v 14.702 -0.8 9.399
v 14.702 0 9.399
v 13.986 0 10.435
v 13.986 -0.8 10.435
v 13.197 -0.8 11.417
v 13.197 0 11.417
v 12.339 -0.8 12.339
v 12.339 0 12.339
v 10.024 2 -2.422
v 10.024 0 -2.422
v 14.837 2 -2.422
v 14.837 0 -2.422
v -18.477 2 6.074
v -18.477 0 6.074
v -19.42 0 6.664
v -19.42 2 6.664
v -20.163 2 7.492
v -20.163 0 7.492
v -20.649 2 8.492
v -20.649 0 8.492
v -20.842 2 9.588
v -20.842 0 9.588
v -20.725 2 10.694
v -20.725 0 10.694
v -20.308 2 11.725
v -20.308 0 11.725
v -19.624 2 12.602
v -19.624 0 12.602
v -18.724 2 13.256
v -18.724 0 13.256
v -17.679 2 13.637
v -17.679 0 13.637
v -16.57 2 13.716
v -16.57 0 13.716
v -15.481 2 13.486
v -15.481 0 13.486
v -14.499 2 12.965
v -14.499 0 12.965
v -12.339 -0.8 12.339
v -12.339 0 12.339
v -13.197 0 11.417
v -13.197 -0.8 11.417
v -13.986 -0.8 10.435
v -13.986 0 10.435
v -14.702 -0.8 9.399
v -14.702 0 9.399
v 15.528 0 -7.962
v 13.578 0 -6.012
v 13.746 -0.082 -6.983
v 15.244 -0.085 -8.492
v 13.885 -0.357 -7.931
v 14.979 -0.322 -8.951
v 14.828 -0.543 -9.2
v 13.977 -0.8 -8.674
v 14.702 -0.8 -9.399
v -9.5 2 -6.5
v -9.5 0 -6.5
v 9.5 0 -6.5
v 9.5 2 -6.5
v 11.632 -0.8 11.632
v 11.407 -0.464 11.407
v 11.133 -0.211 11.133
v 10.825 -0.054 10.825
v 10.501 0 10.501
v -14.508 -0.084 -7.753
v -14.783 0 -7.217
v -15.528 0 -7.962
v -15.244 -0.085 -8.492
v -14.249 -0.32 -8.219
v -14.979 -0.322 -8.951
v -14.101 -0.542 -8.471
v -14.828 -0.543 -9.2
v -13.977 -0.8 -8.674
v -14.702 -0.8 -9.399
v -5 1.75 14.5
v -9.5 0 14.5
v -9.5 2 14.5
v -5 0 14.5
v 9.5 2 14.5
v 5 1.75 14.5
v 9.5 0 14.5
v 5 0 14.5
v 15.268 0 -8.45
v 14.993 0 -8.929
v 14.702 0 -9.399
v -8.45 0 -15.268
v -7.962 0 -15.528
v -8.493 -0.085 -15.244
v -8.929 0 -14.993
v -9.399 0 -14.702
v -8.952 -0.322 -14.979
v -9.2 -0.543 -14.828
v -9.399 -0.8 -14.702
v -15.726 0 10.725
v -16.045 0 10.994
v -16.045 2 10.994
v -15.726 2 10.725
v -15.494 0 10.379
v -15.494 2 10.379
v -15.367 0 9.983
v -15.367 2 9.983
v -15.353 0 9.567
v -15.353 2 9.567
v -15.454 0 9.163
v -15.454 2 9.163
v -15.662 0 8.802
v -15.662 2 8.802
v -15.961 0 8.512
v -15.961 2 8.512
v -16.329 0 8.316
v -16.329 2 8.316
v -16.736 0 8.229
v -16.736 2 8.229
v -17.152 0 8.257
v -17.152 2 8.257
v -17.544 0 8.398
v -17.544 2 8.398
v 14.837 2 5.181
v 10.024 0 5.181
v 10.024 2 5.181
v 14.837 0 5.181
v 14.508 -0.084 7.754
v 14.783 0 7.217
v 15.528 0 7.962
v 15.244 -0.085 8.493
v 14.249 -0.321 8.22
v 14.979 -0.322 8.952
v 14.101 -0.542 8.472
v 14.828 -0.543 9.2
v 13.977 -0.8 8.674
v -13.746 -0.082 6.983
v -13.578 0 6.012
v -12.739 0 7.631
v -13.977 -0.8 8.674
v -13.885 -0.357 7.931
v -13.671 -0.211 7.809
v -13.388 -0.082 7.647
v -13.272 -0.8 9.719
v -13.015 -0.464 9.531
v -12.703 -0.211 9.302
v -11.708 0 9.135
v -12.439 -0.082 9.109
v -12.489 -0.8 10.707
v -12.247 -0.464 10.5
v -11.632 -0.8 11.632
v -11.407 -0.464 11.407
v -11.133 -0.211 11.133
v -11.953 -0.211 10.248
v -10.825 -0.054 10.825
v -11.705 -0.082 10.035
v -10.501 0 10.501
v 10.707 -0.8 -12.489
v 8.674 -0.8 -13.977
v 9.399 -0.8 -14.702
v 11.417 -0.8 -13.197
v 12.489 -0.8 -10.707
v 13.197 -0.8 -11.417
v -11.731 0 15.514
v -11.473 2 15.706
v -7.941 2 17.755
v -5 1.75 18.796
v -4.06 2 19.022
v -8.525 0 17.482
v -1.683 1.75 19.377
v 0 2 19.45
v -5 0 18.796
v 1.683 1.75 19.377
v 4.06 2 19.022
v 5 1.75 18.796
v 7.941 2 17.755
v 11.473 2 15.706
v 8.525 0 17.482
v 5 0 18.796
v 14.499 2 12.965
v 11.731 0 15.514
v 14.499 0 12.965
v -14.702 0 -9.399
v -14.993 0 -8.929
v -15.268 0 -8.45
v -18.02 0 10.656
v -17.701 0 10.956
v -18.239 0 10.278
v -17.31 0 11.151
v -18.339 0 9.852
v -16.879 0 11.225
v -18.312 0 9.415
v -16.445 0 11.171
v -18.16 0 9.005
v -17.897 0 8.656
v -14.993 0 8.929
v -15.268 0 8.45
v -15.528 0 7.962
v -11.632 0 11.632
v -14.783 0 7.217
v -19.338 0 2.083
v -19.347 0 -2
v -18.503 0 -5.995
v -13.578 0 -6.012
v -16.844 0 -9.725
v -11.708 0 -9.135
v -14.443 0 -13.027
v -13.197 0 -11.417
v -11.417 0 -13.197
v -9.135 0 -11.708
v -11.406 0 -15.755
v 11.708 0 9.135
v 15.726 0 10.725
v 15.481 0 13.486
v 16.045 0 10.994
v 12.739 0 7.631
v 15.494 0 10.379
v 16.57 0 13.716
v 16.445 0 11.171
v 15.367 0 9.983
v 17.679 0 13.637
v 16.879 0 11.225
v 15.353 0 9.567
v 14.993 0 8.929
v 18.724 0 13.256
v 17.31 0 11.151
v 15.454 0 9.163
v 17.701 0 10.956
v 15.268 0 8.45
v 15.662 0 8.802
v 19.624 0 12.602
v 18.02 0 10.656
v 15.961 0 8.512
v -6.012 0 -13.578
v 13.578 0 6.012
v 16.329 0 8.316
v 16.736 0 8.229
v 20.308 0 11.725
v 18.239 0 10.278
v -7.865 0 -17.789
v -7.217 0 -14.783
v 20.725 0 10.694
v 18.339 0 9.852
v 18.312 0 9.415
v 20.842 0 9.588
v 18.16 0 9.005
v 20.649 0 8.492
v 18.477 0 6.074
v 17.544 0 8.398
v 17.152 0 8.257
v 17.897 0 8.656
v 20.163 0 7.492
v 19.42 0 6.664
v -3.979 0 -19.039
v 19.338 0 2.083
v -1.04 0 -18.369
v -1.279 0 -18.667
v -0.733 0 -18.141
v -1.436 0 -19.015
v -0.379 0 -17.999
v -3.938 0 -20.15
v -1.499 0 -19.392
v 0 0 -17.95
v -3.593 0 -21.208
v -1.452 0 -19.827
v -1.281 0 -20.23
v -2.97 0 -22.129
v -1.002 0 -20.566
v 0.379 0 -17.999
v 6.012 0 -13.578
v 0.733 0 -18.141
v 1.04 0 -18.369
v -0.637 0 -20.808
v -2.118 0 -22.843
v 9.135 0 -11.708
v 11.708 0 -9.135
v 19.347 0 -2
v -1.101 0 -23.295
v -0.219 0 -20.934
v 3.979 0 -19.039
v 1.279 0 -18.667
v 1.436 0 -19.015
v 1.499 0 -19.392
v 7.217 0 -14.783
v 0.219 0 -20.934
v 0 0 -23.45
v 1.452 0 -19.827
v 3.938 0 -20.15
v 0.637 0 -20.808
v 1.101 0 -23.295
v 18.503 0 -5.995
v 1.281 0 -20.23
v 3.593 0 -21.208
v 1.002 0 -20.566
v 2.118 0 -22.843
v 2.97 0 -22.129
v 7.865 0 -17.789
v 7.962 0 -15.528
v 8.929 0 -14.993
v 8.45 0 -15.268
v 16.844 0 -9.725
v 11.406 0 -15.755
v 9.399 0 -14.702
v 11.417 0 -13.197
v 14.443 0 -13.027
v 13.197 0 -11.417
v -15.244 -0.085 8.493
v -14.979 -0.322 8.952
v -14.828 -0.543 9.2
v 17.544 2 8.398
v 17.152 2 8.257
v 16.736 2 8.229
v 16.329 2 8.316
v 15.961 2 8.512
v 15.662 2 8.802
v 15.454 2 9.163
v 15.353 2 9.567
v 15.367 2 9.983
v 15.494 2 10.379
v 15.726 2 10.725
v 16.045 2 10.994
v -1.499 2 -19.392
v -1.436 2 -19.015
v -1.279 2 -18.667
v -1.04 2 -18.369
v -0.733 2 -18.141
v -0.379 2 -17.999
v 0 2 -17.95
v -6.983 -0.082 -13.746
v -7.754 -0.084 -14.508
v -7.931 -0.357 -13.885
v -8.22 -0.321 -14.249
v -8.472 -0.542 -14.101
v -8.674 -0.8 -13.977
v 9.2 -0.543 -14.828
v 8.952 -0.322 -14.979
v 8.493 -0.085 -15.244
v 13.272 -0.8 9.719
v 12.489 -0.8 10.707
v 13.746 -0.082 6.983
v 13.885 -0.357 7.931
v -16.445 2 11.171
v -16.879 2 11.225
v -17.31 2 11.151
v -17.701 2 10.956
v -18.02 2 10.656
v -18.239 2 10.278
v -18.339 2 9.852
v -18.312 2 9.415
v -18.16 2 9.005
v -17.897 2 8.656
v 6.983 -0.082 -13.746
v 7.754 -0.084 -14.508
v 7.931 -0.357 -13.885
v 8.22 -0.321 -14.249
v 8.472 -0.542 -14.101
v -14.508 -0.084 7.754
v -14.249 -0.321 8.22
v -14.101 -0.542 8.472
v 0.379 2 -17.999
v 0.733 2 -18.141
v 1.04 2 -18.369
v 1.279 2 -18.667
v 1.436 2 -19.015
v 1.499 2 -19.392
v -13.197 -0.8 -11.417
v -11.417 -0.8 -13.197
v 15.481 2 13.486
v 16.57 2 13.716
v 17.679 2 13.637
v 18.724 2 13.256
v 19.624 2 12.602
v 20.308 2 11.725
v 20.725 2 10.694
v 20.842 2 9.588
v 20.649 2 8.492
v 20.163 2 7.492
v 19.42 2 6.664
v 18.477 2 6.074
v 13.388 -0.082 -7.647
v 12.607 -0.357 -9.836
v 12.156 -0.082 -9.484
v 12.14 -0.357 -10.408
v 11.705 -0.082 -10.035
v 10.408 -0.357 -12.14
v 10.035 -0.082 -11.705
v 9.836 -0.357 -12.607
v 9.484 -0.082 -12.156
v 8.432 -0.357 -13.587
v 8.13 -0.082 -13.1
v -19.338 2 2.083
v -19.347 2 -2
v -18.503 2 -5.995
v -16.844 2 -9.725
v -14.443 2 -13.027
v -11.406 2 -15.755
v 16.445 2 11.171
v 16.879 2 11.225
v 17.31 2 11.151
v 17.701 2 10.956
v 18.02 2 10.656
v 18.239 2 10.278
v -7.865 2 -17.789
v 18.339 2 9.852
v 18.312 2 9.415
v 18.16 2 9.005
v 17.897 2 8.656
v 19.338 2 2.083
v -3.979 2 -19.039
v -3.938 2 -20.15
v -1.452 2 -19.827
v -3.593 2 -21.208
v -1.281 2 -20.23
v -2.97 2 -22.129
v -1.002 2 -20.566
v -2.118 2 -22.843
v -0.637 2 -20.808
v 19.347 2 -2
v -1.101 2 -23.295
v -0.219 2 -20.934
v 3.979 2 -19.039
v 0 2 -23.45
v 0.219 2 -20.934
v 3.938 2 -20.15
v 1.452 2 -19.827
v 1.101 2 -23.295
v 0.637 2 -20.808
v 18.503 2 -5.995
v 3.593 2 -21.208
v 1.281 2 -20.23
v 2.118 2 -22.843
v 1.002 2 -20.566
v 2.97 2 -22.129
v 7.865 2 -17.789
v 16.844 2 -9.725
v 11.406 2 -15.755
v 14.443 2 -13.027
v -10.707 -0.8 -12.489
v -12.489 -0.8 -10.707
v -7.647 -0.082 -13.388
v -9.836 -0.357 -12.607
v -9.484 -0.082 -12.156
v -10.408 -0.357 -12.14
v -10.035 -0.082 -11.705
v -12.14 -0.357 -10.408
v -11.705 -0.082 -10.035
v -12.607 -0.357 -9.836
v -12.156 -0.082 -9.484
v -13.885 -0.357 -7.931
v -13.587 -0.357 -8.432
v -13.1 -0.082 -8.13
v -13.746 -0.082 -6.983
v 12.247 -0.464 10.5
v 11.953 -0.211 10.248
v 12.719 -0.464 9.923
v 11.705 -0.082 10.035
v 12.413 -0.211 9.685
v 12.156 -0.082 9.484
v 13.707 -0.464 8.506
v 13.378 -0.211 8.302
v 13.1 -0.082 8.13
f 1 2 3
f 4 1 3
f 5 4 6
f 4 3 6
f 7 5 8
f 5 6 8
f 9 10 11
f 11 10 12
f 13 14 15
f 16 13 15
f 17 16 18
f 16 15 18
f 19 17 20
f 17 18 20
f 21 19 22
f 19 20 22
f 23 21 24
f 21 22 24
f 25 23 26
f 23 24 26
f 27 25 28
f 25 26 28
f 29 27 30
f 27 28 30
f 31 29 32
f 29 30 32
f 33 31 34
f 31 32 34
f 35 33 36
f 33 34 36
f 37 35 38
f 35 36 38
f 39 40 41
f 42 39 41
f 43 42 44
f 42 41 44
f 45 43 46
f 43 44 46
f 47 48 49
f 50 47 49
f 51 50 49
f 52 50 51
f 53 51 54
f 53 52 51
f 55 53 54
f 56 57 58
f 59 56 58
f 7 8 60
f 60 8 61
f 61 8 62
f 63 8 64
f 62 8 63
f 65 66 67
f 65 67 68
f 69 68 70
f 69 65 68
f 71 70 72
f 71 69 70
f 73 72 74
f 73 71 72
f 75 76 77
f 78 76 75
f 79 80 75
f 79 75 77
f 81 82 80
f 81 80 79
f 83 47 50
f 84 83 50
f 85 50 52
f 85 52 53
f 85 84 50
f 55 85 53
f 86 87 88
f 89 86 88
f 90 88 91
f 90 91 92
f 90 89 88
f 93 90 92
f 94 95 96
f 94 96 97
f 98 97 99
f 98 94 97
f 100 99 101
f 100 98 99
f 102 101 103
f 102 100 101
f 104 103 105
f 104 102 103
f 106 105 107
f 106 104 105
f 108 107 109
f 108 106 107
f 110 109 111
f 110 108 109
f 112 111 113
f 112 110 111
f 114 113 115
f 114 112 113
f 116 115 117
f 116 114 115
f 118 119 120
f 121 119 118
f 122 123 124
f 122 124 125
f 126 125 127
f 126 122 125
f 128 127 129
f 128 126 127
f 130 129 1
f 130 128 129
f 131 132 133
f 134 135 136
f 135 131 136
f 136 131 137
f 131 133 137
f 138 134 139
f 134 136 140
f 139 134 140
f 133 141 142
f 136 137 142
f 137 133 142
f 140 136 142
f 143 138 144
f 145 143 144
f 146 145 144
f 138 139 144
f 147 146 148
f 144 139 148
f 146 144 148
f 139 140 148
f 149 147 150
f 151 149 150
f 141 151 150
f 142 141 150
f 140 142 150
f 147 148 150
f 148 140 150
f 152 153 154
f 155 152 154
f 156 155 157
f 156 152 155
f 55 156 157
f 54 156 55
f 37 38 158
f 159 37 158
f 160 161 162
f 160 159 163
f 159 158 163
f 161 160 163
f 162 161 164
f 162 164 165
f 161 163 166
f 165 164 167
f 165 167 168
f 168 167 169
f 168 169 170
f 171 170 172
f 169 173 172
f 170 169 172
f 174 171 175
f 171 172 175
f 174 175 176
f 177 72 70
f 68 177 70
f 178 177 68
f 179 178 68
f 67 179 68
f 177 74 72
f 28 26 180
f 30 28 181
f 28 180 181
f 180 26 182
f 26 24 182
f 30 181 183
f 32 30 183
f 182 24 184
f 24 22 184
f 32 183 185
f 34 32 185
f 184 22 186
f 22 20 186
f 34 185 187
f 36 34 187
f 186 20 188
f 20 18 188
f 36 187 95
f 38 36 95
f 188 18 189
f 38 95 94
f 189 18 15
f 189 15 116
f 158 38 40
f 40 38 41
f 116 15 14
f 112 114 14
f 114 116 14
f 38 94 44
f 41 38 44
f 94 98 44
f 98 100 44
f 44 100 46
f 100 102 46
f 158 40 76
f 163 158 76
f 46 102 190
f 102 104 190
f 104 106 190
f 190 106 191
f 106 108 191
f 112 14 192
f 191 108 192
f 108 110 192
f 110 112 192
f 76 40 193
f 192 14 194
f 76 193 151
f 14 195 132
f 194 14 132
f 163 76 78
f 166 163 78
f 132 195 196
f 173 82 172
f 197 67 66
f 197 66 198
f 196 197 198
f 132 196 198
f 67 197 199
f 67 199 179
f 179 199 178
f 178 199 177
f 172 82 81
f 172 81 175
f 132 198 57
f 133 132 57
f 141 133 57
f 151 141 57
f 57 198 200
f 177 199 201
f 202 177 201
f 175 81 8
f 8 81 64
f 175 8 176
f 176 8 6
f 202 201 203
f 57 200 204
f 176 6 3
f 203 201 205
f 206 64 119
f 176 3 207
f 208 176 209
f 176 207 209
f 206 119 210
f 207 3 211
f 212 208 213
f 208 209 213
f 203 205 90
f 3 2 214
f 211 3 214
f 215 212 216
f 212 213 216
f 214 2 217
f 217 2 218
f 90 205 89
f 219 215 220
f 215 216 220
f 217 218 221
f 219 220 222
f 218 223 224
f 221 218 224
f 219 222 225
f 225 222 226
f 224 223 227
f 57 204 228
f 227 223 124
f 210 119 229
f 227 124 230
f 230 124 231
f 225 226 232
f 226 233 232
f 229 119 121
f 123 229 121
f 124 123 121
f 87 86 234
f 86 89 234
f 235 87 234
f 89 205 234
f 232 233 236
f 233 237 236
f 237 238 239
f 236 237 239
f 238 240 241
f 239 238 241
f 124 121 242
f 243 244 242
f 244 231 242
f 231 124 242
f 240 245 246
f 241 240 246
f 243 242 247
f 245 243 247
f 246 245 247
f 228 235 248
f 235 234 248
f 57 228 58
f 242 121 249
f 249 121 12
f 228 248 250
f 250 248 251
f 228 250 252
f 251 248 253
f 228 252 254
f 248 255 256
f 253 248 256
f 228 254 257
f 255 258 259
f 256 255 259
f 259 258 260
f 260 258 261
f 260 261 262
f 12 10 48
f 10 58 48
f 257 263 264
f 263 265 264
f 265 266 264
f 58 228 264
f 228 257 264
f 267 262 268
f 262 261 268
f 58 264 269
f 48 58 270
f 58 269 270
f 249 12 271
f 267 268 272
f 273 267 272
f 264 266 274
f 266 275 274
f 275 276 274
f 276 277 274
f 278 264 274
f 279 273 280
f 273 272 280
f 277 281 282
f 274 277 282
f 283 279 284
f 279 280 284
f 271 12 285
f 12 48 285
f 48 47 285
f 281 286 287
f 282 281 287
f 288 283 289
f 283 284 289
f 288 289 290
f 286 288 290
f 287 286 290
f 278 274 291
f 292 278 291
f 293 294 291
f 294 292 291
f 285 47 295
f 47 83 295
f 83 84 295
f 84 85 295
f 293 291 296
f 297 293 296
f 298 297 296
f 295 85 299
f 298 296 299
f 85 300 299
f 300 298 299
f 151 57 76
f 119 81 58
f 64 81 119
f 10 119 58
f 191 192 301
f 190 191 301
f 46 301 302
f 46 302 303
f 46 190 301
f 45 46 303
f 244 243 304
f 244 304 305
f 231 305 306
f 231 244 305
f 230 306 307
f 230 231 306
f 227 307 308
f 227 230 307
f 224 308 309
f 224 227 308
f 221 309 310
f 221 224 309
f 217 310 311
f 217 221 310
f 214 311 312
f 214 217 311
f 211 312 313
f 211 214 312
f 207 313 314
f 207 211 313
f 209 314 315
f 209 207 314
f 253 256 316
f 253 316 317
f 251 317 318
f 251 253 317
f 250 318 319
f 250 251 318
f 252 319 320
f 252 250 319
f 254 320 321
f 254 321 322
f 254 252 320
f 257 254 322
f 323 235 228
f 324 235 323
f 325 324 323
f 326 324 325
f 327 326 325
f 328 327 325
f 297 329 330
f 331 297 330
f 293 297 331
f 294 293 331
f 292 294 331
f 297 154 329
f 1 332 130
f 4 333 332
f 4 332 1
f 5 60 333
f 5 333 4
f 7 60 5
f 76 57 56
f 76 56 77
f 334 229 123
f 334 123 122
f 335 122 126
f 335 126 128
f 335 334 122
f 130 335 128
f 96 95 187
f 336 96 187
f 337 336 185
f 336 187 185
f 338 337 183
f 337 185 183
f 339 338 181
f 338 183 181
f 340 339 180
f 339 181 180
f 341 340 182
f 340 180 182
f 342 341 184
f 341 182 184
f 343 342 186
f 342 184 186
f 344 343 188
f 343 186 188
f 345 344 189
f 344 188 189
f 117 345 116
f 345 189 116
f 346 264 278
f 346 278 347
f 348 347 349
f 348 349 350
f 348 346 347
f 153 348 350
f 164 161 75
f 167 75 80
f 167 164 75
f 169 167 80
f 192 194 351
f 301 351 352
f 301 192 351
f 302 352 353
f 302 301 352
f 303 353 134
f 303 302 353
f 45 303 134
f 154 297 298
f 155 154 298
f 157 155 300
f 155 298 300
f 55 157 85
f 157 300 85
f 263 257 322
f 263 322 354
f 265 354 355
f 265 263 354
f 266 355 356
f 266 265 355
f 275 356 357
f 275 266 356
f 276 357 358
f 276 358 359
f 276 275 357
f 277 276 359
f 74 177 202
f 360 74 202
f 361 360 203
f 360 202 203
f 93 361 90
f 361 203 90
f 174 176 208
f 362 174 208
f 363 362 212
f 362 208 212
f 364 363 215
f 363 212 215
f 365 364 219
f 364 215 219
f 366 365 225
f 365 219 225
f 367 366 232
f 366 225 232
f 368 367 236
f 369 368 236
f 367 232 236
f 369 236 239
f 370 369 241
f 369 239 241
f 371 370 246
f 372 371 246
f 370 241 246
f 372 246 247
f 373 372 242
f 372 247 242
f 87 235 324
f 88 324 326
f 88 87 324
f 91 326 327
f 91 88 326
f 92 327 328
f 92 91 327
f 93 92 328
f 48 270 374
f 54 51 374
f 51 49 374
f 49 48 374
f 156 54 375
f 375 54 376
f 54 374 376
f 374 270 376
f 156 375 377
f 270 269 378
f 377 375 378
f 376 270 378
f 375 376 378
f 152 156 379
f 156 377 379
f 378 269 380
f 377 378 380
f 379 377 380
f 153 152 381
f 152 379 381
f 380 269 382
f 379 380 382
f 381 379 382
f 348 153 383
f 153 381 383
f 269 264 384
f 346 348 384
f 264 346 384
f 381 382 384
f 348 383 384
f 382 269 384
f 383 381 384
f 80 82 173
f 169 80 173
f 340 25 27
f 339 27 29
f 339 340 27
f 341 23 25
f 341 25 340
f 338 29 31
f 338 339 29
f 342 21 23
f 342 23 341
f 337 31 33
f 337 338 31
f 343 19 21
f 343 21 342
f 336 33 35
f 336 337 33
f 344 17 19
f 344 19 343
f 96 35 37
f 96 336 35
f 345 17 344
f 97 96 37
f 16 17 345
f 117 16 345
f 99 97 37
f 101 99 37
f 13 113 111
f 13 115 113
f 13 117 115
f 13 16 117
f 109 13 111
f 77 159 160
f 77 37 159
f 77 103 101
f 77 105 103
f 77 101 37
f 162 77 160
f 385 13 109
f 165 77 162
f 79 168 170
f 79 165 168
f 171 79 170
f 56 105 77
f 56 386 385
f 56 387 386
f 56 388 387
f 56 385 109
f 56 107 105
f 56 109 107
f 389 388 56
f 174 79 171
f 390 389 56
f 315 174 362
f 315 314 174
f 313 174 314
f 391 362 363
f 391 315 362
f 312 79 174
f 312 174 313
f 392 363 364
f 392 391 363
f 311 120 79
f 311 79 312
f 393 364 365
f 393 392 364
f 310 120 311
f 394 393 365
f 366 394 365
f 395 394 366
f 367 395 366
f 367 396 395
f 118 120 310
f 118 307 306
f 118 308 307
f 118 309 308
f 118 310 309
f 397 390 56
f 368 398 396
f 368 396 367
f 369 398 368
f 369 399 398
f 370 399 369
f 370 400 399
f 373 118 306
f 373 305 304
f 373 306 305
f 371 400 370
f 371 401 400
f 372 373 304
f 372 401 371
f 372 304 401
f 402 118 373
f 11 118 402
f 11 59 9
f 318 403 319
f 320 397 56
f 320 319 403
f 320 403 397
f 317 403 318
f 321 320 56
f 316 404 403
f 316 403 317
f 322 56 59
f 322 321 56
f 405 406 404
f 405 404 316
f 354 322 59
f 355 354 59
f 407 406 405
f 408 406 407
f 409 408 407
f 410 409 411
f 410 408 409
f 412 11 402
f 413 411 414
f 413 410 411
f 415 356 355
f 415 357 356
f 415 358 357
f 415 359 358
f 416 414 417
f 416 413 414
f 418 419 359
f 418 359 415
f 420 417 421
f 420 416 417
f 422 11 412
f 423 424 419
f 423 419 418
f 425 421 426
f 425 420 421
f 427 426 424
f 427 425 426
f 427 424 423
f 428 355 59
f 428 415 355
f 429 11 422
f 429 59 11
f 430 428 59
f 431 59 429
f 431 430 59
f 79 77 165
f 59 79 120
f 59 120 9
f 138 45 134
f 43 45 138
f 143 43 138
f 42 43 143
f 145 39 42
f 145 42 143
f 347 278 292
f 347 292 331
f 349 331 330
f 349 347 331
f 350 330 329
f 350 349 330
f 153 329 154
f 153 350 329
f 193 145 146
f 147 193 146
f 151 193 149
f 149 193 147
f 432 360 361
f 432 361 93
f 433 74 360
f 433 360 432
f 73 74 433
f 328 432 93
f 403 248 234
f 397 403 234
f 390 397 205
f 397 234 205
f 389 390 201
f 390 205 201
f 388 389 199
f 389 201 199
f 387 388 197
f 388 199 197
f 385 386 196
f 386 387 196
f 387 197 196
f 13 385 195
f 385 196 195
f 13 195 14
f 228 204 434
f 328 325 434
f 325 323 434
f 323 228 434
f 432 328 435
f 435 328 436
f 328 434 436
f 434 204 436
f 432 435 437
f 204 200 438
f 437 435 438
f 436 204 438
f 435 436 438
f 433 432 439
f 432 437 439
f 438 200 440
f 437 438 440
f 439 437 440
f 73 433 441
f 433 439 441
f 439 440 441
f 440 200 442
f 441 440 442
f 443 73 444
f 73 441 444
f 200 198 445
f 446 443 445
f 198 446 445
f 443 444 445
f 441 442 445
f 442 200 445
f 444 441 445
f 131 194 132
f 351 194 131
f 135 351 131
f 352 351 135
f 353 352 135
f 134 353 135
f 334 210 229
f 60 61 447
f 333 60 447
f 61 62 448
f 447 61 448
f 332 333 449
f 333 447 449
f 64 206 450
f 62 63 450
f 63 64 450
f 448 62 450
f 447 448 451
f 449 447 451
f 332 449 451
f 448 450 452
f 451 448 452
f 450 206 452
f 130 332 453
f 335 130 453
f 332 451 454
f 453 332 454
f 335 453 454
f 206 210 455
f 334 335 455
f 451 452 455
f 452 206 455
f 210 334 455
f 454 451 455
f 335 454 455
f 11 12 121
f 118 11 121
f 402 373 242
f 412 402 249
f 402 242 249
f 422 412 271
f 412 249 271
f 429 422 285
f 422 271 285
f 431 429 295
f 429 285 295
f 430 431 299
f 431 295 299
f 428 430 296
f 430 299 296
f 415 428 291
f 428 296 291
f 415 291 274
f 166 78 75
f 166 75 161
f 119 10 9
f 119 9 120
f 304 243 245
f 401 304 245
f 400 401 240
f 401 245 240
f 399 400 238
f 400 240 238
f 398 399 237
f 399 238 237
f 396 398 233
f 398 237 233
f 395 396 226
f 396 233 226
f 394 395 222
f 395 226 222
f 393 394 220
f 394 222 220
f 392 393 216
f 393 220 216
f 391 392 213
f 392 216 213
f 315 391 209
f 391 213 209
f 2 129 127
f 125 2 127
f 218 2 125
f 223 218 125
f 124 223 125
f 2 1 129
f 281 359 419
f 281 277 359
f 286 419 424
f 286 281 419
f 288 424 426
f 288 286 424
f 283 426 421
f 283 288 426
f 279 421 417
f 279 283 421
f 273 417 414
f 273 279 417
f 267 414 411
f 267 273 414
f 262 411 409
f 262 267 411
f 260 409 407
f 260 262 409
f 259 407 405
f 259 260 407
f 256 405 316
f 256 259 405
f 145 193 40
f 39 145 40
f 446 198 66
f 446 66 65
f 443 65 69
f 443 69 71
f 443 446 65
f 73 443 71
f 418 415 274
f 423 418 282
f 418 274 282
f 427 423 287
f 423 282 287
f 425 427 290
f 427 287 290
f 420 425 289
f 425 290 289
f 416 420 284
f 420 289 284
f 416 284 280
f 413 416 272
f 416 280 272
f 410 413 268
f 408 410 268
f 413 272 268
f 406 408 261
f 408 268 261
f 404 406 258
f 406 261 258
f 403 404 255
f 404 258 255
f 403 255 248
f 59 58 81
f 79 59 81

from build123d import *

# Parameters (mm, degrees)
ESQUISSE2_R                    = 19.45
BOSS_EXTRU_1_DEPTH             = 2
ESQUISSE2_3_R                  = 19.45
ESQUISSE2_3_R_2                = 4
ESQUISSE2_3_R_3                = 1.5
BOSS_EXTRU_2_DEPTH             = 2
ENL_V_MAT_EXTRU_2_DEPTH        = 2
R_P_TITION_CIRCULAIRE1_DEPTH   = 2
R_P_TITION_CIRCULAIRE1_2_DEPTH = 2
BOSS_EXTRU_3_DEPTH             = 0.8
CONG_1_R                       = 2
ESQUISSE6_W                    = 4.812747309
ESQUISSE6_H                    = 7.603139871
ENL_V_MAT_EXTRU_3_DEPTH        = 10
ESQUISSE7_W                    = 19
ESQUISSE7_H                    = 21
ENL_V_MAT_EXTRU_4_DEPTH        = 3.5
ESQUISSE8_W                    = 10
ESQUISSE8_H                    = 6.246978905
ENL_V_MAT_EXTRU_5_DEPTH        = 1.75


# Read off the part's stored shape, not the designer's step: Répétition circulaire1
with BuildPart() as part:
    # Esquisse2 → Boss.-Extru.1 (new body)
    with BuildSketch(Plane(origin=(0, 0, 0), x_dir=(1, 0, 0), z_dir=(0, 1, 0))):
        with Locations(Location((0, 0, 0), (0, 0, 270))):
            Circle(ESQUISSE2_R)
    extrude(amount=BOSS_EXTRU_1_DEPTH)

    # Esquisse2<3> → Boss.-Extru.2 (add)
    # profile 1 of 2: a face of its own
    with BuildSketch(Plane(origin=(0, 0, 0), x_dir=(1, 0, 0), z_dir=(0, 1, 0))):
        Circle(ESQUISSE2_3_R)
    # profile 2 of 2: a face of its own
    with BuildSketch(Plane(origin=(0, 0, 0), x_dir=(1, 0, 0), z_dir=(0, 1, 0))):
        with Locations((0, 19.45)):
            Circle(ESQUISSE2_3_R_2)
        with Locations((0, 19.45)):
            Circle(ESQUISSE2_3_R_3, mode=Mode.SUBTRACT)
    extrude(amount=BOSS_EXTRU_2_DEPTH)

    # Esquisse2<4> → Enlèv. mat.-Extru.2 (cut)
    with BuildSketch(Plane(origin=(0, 0, 0), x_dir=(1, 0, 0), z_dir=(0, 1, 0))):
        with BuildLine():
            ThreePointArc((1.498884406, 19.392159383), (0.75, 19.435534467), (0, 19.45))
            Line((0, 19.45), (0, 17.95))
            ThreePointArc((0, 17.95), (1.040009393, 18.369083508), (1.498884406, 19.392159383))
        make_face()
        with BuildLine():
            Line((0, 17.95), (0, 19.45))
            ThreePointArc((0, 19.45), (-0.75, 19.435534467), (-1.498884406, 19.392159383))
            ThreePointArc((-1.498884406, 19.392159383), (-1.040009393, 18.369083508), (0, 17.95))
        make_face()
    extrude(amount=ENL_V_MAT_EXTRU_2_DEPTH, mode=Mode.SUBTRACT)

    # Répétition circulaire1 outline → Répétition circulaire1 (cut)
    with BuildSketch(Plane(origin=(0, 0, 0), x_dir=(1, 0, 0), z_dir=(0, 1, 0))):
        with BuildLine():
            ThreePointArc((16.044660457, -10.994151664), (16.844194104, -9.725), (17.543544863, -8.398007718))
            ThreePointArc((17.543544863, -8.398007718), (15.545155998, -8.975), (16.044660457, -10.994151664))
        make_face()
        with BuildLine():
            ThreePointArc((-17.543544863, -8.398007718), (-16.844194104, -9.725), (-16.044660457, -10.994151664))
            ThreePointArc((-16.044660457, -10.994151664), (-15.545155998, -8.975), (-17.543544863, -8.398007718))
        make_face()
    extrude(amount=R_P_TITION_CIRCULAIRE1_DEPTH, mode=Mode.SUBTRACT)

    # R_p_tition circulaire1 2 outline → R_p_tition circulaire1 2 (add)
    with BuildSketch(Plane(origin=(0, 0, 0), x_dir=(1, 0, 0), z_dir=(0, 1, 0))):
        with BuildLine():
            ThreePointArc((17.543544863, -8.398007718), (18.14323221, -10.475), (16.044660457, -10.994151664))
            ThreePointArc((16.044660457, -10.994151664), (15.303387831, -12.004533347), (14.49858993, -12.965083496))
            ThreePointArc((14.49858993, -12.965083496), (20.308295719, -11.725), (18.477386634, -6.07360545))
            ThreePointArc((18.477386634, -6.07360545), (18.047924755, -7.250855952), (17.543544863, -8.398007718))
        make_face()
        with BuildLine():
            ThreePointArc((-18.477386634, -6.07360545), (-20.308295719, -11.725), (-14.49858993, -12.965083496))
            ThreePointArc((-14.49858993, -12.965083496), (-15.303387831, -12.004533347), (-16.044660457, -10.994151664))
            ThreePointArc((-16.044660457, -10.994151664), (-18.14323221, -10.475), (-17.543544863, -8.398007718))
            ThreePointArc((-17.543544863, -8.398007718), (-18.047924755, -7.250855952), (-18.477386634, -6.07360545))
        make_face()
    extrude(amount=R_P_TITION_CIRCULAIRE1_2_DEPTH)

    # Esquisse5 → Boss.-Extru.3 (add)
    with BuildSketch(Plane.XZ):
        with BuildLine():
            Line((8.673984211, -13.97728507), (9.39907569, -14.702376549))
            ThreePointArc((9.39907569, -14.702376549), (12.339013332, -12.339013332), (14.702376549, -9.39907569))
            Line((14.702376549, -9.39907569), (13.97728507, -8.673984211))
            ThreePointArc((13.97728507, -8.673984211), (11.631906551, -11.631906551), (8.673984211, -13.97728507))
        make_face()
        with BuildLine():
            ThreePointArc((-14.702376549, -9.39907569), (-12.339013332, -12.339013332), (-9.39907569, -14.702376549))
            Line((-9.39907569, -14.702376549), (-8.673984211, -13.97728507))
            ThreePointArc((-8.673984211, -13.97728507), (-11.631906551, -11.631906551), (-13.97728507, -8.673984211))
            Line((-13.97728507, -8.673984211), (-14.702376549, -9.39907569))
        make_face()
        with BuildLine():
            Line((13.97728507, 8.673984211), (14.702376549, 9.39907569))
            ThreePointArc((14.702376549, 9.39907569), (13.600367642, 10.933091969), (12.339013332, 12.339013332))
            Line((12.339013332, 12.339013332), (11.631906551, 11.631906551))
            ThreePointArc((11.631906551, 11.631906551), (12.88972459, 10.220445196), (13.97728507, 8.673984211))
        make_face()
        with BuildLine():
            ThreePointArc((-12.339013332, 12.339013332), (-13.600367642, 10.933091969), (-14.702376549, 9.39907569))
            Line((-14.702376549, 9.39907569), (-13.97728507, 8.673984211))
            ThreePointArc((-13.97728507, 8.673984211), (-12.88972459, 10.220445196), (-11.631906551, 11.631906551))
            Line((-11.631906551, 11.631906551), (-12.339013332, 12.339013332))
        make_face()
    extrude(amount=BOSS_EXTRU_3_DEPTH)

    # Congé1
    # the kernel refuses this fillet: 2 mm, written as the material it adds along each edge
    with BuildSketch(Plane(origin=(11.148857945, 0, 5.845557086), x_dir=(0.7071067811865459, 0, -0.7071067811865492), z_dir=(0.7071067811865492, 0, 0.7071067811865458))) as cong_1_piece_1_section:
        with BuildLine():
            CenterArc((1.6, -2), CONG_1_R, 90, 53.130102354)
            Line((0, -0.8), (-0.032, -0.776))
            ThreePointArc((-0.032, -0.776), (-0.04, -0.4), (-0.04, 0))
            Line((-0.04, 0), (0, 0.04))
            Line((0, 0.04), (1.6, 0.04))
            Line((1.6, 0.04), (1.6, 0))
        make_face()
    cong_1_piece_1 = extrude(amount=9.025434204, mode=Mode.PRIVATE)
    cong_1_piece_1 = cong_1_piece_1 & Plane(origin=(0, -0.204103776, 0), x_dir=(0.8425430686905786, 0, 0.5386289793554215), z_dir=(0, 1, 0)) * Cylinder(17.45, 25, mode=Mode.PRIVATE)
    cong_1_piece_1 = cong_1_piece_1 - Plane(origin=(0, -0.204103776, 0), x_dir=(0.7071067811865577, 0, 0.7071067811865375), z_dir=(0, 1, 0)) * Cylinder(16.45, 25, mode=Mode.PRIVATE)
    add(cong_1_piece_1)
    with BuildSketch(Plane(origin=(0, 0, 0), x_dir=(0.7071067811865576, 0, 0.7071067811865375), z_dir=(-0.7071067811865375, 0, 0.7071067811865576))) as cong_1_piece_2_section:
        with BuildLine():
            CenterArc((14.85, -2), CONG_1_R, 36.869897646, 53.130102354)
            Line((16.45, -0.8), (16.482, -0.776))
            ThreePointArc((16.482, -0.776), (16.49, -0.4), (16.49, 0))
            Line((16.49, 0), (16.45, 0.04))
            Line((16.45, 0.04), (14.85, 0.04))
            Line((14.85, 0.04), (14.85, 0))
        make_face()
    cong_1_piece_2 = revolve(axis=Axis((0, 0, 0), (0, 1, 0)), revolution_arc=27.109429972, mode=Mode.PRIVATE)
    cong_1_piece_2 = split(cong_1_piece_2, bisect_by=Plane(origin=(13.88723244, -0.204725798, 8.583931581), z_dir=(-0.7071067811865458, 0, 0.7071067811865492)), keep=Keep.TOP, mode=Mode.PRIVATE)
    add(cong_1_piece_2)
    with BuildSketch(Plane(origin=(0, 0, 0), x_dir=(-0.9516449769891426, 0, 0.30719999637261464), z_dir=(-0.30719999637261464, 0, -0.9516449769891426))) as cong_1_piece_3_section:
        with BuildLine():
            CenterArc((14.85, -2), CONG_1_R, 36.869897646, 53.130102354)
            Line((16.45, -0.8), (16.482, -0.776))
            ThreePointArc((16.482, -0.776), (16.49, -0.4), (16.49, 0))
            Line((16.49, 0), (16.45, 0.04))
            Line((16.45, 0.04), (14.85, 0.04))
            Line((14.85, 0.04), (14.85, 0))
        make_face()
    cong_1_piece_3 = revolve(axis=Axis((0, 0, 0), (0, 1, 0)), revolution_arc=27.109429972, mode=Mode.PRIVATE)
    cong_1_piece_3 = split(cong_1_piece_3, bisect_by=Plane(origin=(-13.887232342, -0.20472579, 8.583931483), z_dir=(0.7071067811865458, 0, 0.7071067811865493)), keep=Keep.TOP, mode=Mode.PRIVATE)
    add(cong_1_piece_3)
    with BuildSketch(Plane(origin=(-17.530803673, 0, 12.227502814), x_dir=(-0.7071067811865458, 0, -0.7071067811865493), z_dir=(0.7071067811865493, 0, -0.7071067811865458))) as cong_1_piece_4_section:
        with BuildLine():
            CenterArc((1.6, -2), CONG_1_R, 90, 53.130102354)
            Line((0, -0.8), (-0.032, -0.776))
            ThreePointArc((-0.032, -0.776), (-0.04, -0.4), (-0.04, 0))
            Line((-0.04, 0), (0, 0.04))
            Line((0, 0.04), (1.6, 0.04))
            Line((1.6, 0.04), (1.6, 0))
        make_face()
    cong_1_piece_4 = extrude(amount=9.025434204, mode=Mode.PRIVATE)
    cong_1_piece_4 = cong_1_piece_4 & Plane(origin=(0, -0.204103718, 0), x_dir=(-0.7071067811865558, 0, 0.7071067811865394), z_dir=(0, 1, 0)) * Cylinder(17.45, 25, mode=Mode.PRIVATE)
    cong_1_piece_4 = cong_1_piece_4 - Plane(origin=(0, -0.204103718, 0), x_dir=(-0.8496829829485655, 0, 0.527293872985101), z_dir=(0, 1, 0)) * Cylinder(16.45, 25, mode=Mode.PRIVATE)
    add(cong_1_piece_4)
    with BuildSketch(Plane(origin=(17.530803673, 0, -12.227502814), x_dir=(0.7071067811865459, 0, 0.7071067811865492), z_dir=(-0.7071067811865492, 0, 0.7071067811865458))) as cong_1_piece_5_section:
        with BuildLine():
            CenterArc((1.6, -2), CONG_1_R, 90, 53.130102354)
            Line((0, -0.8), (-0.032, -0.776))
            ThreePointArc((-0.032, -0.776), (-0.04, -0.4), (-0.04, 0))
            Line((-0.04, 0), (0, 0.04))
            Line((0, 0.04), (1.6, 0.04))
            Line((1.6, 0.04), (1.6, 0))
        make_face()
    cong_1_piece_5 = extrude(amount=9.025434204, mode=Mode.PRIVATE)
    cong_1_piece_5 = cong_1_piece_5 & Plane(origin=(0, -0.204103718, 0), x_dir=(0.5386289793554239, 0, -0.8425430686905769), z_dir=(0, 1, 0)) * Cylinder(17.45, 25, mode=Mode.PRIVATE)
    cong_1_piece_5 = cong_1_piece_5 - Plane(origin=(0, -0.204103718, 0), x_dir=(0.849682982948563, 0, -0.5272938729851051), z_dir=(0, 1, 0)) * Cylinder(16.45, 25, mode=Mode.PRIVATE)
    add(cong_1_piece_5)
    with BuildSketch(Plane(origin=(0, 0, 0), x_dir=(0.9516469062705674, 0, -0.30719401977521954), z_dir=(0.30719401977521954, 0, 0.9516469062705674))) as cong_1_piece_6_section:
        with BuildLine():
            CenterArc((14.85, -2), CONG_1_R, 36.869897646, 53.130102354)
            Line((16.45, -0.8), (16.482, -0.776))
            ThreePointArc((16.482, -0.776), (16.49, -0.4), (16.49, 0))
            Line((16.49, 0), (16.45, 0.04))
            Line((16.45, 0.04), (14.85, 0.04))
            Line((14.85, 0.04), (14.85, 0))
        make_face()
    cong_1_piece_6 = revolve(axis=Axis((0, 0, 0), (0, 1, 0)), revolution_arc=54.21957961, mode=Mode.PRIVATE)
    cong_1_piece_6 = split(cong_1_piece_6, bisect_by=Plane(origin=(8.583931605, -0.20472582, -13.887232464), z_dir=(0.7071067811865467, 0, 0.7071067811865485)), keep=Keep.TOP, mode=Mode.PRIVATE)
    cong_1_piece_6 = split(cong_1_piece_6, bisect_by=Plane(origin=(13.887232464, -0.20472582, -8.583931605), z_dir=(-0.7071067811865458, 0, -0.7071067811865492)), keep=Keep.TOP, mode=Mode.PRIVATE)
    add(cong_1_piece_6)
    with BuildSketch(Plane(origin=(5.845557086, 0, -11.148857945), x_dir=(-0.7071067811865465, 0, -0.7071067811865485), z_dir=(0.7071067811865485, 0, -0.7071067811865467))) as cong_1_piece_7_section:
        with BuildLine():
            CenterArc((1.6, -2), CONG_1_R, 90, 53.130102354)
            Line((0, -0.8), (-0.032, -0.776))
            ThreePointArc((-0.032, -0.776), (-0.04, -0.4), (-0.04, 0))
            Line((-0.04, 0), (0, 0.04))
            Line((0, 0.04), (1.6, 0.04))
            Line((1.6, 0.04), (1.6, 0))
        make_face()
    cong_1_piece_7 = extrude(amount=9.025434204, mode=Mode.PRIVATE)
    cong_1_piece_7 = cong_1_piece_7 & Plane(origin=(0, -0.204103776, 0), x_dir=(0.5386289793554239, 0, -0.8425430686905769), z_dir=(0, 1, 0)) * Cylinder(17.45, 25, mode=Mode.PRIVATE)
    cong_1_piece_7 = cong_1_piece_7 - Plane(origin=(0, -0.204103776, 0), x_dir=(0.849682982948563, 0, -0.5272938729851051), z_dir=(0, 1, 0)) * Cylinder(16.45, 25, mode=Mode.PRIVATE)
    add(cong_1_piece_7)
    with BuildSketch(Plane(origin=(-12.227502814, 0, -17.530803673), x_dir=(0.7071067811865467, 0, -0.7071067811865483), z_dir=(0.7071067811865485, 0, 0.7071067811865467))) as cong_1_piece_8_section:
        with BuildLine():
            CenterArc((1.6, -2), CONG_1_R, 90, 53.130102354)
            Line((0, -0.8), (-0.032, -0.776))
            ThreePointArc((-0.032, -0.776), (-0.04, -0.4), (-0.04, 0))
            Line((-0.04, 0), (0, 0.04))
            Line((0, 0.04), (1.6, 0.04))
            Line((1.6, 0.04), (1.6, 0))
        make_face()
    cong_1_piece_8 = extrude(amount=9.025434204, mode=Mode.PRIVATE)
    cong_1_piece_8 = cong_1_piece_8 & Plane(origin=(0, -0.204103718, 0), x_dir=(-0.8425430686905772, 0, -0.5386289793554238), z_dir=(0, 1, 0)) * Cylinder(17.45, 25, mode=Mode.PRIVATE)
    cong_1_piece_8 = cong_1_piece_8 - Plane(origin=(0, -0.204103718, 0), x_dir=(-0.5272938729851264, 0, -0.8496829829485496), z_dir=(0, 1, 0)) * Cylinder(16.45, 25, mode=Mode.PRIVATE)
    add(cong_1_piece_8)
    with BuildSketch(Plane(origin=(0, 0, 0), x_dir=(-0.30719401977524424, 0, -0.9516469062705595), z_dir=(0.9516469062705595, 0, -0.30719401977524424))) as cong_1_piece_9_section:
        with BuildLine():
            CenterArc((14.85, -2), CONG_1_R, 36.869897646, 53.130102354)
            Line((16.45, -0.8), (16.482, -0.776))
            ThreePointArc((16.482, -0.776), (16.49, -0.4), (16.49, 0))
            Line((16.49, 0), (16.45, 0.04))
            Line((16.45, 0.04), (14.85, 0.04))
            Line((14.85, 0.04), (14.85, 0))
        make_face()
    cong_1_piece_9 = revolve(axis=Axis((0, 0, 0), (0, 1, 0)), revolution_arc=54.21957961, mode=Mode.PRIVATE)
    cong_1_piece_9 = split(cong_1_piece_9, bisect_by=Plane(origin=(-8.583931605, -0.20472582, -13.887232464), z_dir=(-0.7071067811865467, 0, 0.7071067811865485)), keep=Keep.TOP, mode=Mode.PRIVATE)
    cong_1_piece_9 = split(cong_1_piece_9, bisect_by=Plane(origin=(-13.887232464, -0.20472582, -8.583931605), z_dir=(0.7071067811865458, 0, -0.7071067811865492)), keep=Keep.TOP, mode=Mode.PRIVATE)
    add(cong_1_piece_9)
    with BuildSketch(Plane(origin=(-11.148857945, 0, -5.845557086), x_dir=(-0.7071067811865459, 0, 0.7071067811865492), z_dir=(-0.7071067811865492, 0, -0.7071067811865458))) as cong_1_piece_10_section:
        with BuildLine():
            CenterArc((1.6, -2), CONG_1_R, 90, 53.130102354)
            Line((0, -0.8), (-0.032, -0.776))
            ThreePointArc((-0.032, -0.776), (-0.04, -0.4), (-0.04, 0))
            Line((-0.04, 0), (0, 0.04))
            Line((0, 0.04), (1.6, 0.04))
            Line((1.6, 0.04), (1.6, 0))
        make_face()
    cong_1_piece_10 = extrude(amount=9.025434204, mode=Mode.PRIVATE)
    cong_1_piece_10 = cong_1_piece_10 & Plane(origin=(0, -0.204103776, 0), x_dir=(-0.8425430686905772, 0, -0.5386289793554238), z_dir=(0, 1, 0)) * Cylinder(17.45, 25, mode=Mode.PRIVATE)
    cong_1_piece_10 = cong_1_piece_10 - Plane(origin=(0, -0.204103776, 0), x_dir=(-0.5272938729851264, 0, -0.8496829829485496), z_dir=(0, 1, 0)) * Cylinder(16.45, 25, mode=Mode.PRIVATE)
    add(cong_1_piece_10)
    with BuildSketch(Plane(origin=(11.148857945, 0, 5.845557086), x_dir=(0.7071067811865459, 0, -0.7071067811865492), z_dir=(0.7071067811865492, 0, 0.7071067811865458))) as cong_1_piece_11a_section:
        with BuildLine():
            CenterArc((1.6, -2), CONG_1_R, 90, 53.130102354)
            Line((0, -0.8), (-0.032, -0.776))
            ThreePointArc((-0.032, -0.776), (-0.04, -0.4), (-0.04, 0))
            Line((-0.04, 0), (0, 0.04))
            Line((0, 0.04), (1.6, 0.04))
            Line((1.6, 0.04), (1.6, 0))
        make_face()
    cong_1_piece_11a = extrude(amount=9.025434204, mode=Mode.PRIVATE)
    cong_1_piece_11a = cong_1_piece_11a & Plane(origin=(0, -0.207693111, 0), x_dir=(0.7071067811865577, 0, 0.7071067811865375), z_dir=(0, 1, 0)) * Cylinder(16.45, 25, mode=Mode.PRIVATE)
    with BuildSketch(Plane(origin=(0, 0, 0), x_dir=(0.7071067811865576, 0, 0.7071067811865375), z_dir=(-0.7071067811865375, 0, 0.7071067811865576))) as cong_1_piece_11b_section:
        with BuildLine():
            CenterArc((14.85, -2), CONG_1_R, 36.869897646, 53.130102354)
            Line((16.45, -0.8), (16.482, -0.776))
            ThreePointArc((16.482, -0.776), (16.49, -0.4), (16.49, 0))
            Line((16.49, 0), (16.45, 0.04))
            Line((16.45, 0.04), (14.85, 0.04))
            Line((14.85, 0.04), (14.85, 0))
        make_face()
    cong_1_piece_11b = revolve(axis=Axis((0, 0, 0), (0, 1, 0)), revolution_arc=27.109429972, mode=Mode.PRIVATE)
    cong_1_piece_11b = split(cong_1_piece_11b, bisect_by=Plane(origin=(13.273689354, -0.210053776, 7.970388495), z_dir=(0.7071067811865458, 0, -0.7071067811865492)), keep=Keep.TOP, mode=Mode.PRIVATE)
    cong_1_piece_11 = cong_1_piece_11a & cong_1_piece_11b
    add(cong_1_piece_11)
    with BuildSketch(Plane(origin=(0, 0, 0), x_dir=(-0.9516449769891426, 0, 0.30719999637261464), z_dir=(-0.30719999637261464, 0, -0.9516449769891426))) as cong_1_piece_12a_section:
        with BuildLine():
            CenterArc((14.85, -2), CONG_1_R, 36.869897646, 53.130102354)
            Line((16.45, -0.8), (16.482, -0.776))
            ThreePointArc((16.482, -0.776), (16.49, -0.4), (16.49, 0))
            Line((16.49, 0), (16.45, 0.04))
            Line((16.45, 0.04), (14.85, 0.04))
            Line((14.85, 0.04), (14.85, 0))
        make_face()
    cong_1_piece_12a = revolve(axis=Axis((0, 0, 0), (0, 1, 0)), revolution_arc=27.109429972, mode=Mode.PRIVATE)
    cong_1_piece_12a = split(cong_1_piece_12a, bisect_by=Plane(origin=(-13.273689161, -0.21005368, 7.970388302), z_dir=(-0.7071067811865458, 0, -0.7071067811865493)), keep=Keep.TOP, mode=Mode.PRIVATE)
    with BuildSketch(Plane(origin=(-17.530803673, 0, 12.227502814), x_dir=(-0.7071067811865458, 0, -0.7071067811865493), z_dir=(0.7071067811865493, 0, -0.7071067811865458))) as cong_1_piece_12b_section:
        with BuildLine():
            CenterArc((1.6, -2), CONG_1_R, 90, 53.130102354)
            Line((0, -0.8), (-0.032, -0.776))
            ThreePointArc((-0.032, -0.776), (-0.04, -0.4), (-0.04, 0))
            Line((-0.04, 0), (0, 0.04))
            Line((0, 0.04), (1.6, 0.04))
            Line((1.6, 0.04), (1.6, 0))
        make_face()
    cong_1_piece_12b = extrude(amount=9.025434204, mode=Mode.PRIVATE)
    cong_1_piece_12b = cong_1_piece_12b & Plane(origin=(0, -0.207693101, 0), x_dir=(-0.8496829829485655, 0, 0.527293872985101), z_dir=(0, 1, 0)) * Cylinder(16.45, 25, mode=Mode.PRIVATE)
    cong_1_piece_12 = cong_1_piece_12a & cong_1_piece_12b
    add(cong_1_piece_12)
    with BuildSketch(Plane(origin=(0, 0, 0), x_dir=(0.9516469062705674, 0, -0.30719401977521954), z_dir=(0.30719401977521954, 0, 0.9516469062705674))) as cong_1_piece_13a_section:
        with BuildLine():
            CenterArc((14.85, -2), CONG_1_R, 36.869897646, 53.130102354)
            Line((16.45, -0.8), (16.482, -0.776))
            ThreePointArc((16.482, -0.776), (16.49, -0.4), (16.49, 0))
            Line((16.49, 0), (16.45, 0.04))
            Line((16.45, 0.04), (14.85, 0.04))
            Line((14.85, 0.04), (14.85, 0))
        make_face()
    cong_1_piece_13a = revolve(axis=Axis((0, 0, 0), (0, 1, 0)), revolution_arc=54.21957961, mode=Mode.PRIVATE)
    cong_1_piece_13a = split(cong_1_piece_13a, bisect_by=Plane(origin=(13.27367534, -0.21005361, -7.970374481), z_dir=(0.7071067811865458, 0, 0.7071067811865492)), keep=Keep.TOP, mode=Mode.PRIVATE)
    with BuildSketch(Plane(origin=(17.530803673, 0, -12.227502814), x_dir=(0.7071067811865459, 0, 0.7071067811865492), z_dir=(-0.7071067811865492, 0, 0.7071067811865458))) as cong_1_piece_13b_section:
        with BuildLine():
            CenterArc((1.6, -2), CONG_1_R, 90, 53.130102354)
            Line((0, -0.8), (-0.032, -0.776))
            ThreePointArc((-0.032, -0.776), (-0.04, -0.4), (-0.04, 0))
            Line((-0.04, 0), (0, 0.04))
            Line((0, 0.04), (1.6, 0.04))
            Line((1.6, 0.04), (1.6, 0))
        make_face()
    cong_1_piece_13b = extrude(amount=9.025434204, mode=Mode.PRIVATE)
    cong_1_piece_13b = cong_1_piece_13b & Plane(origin=(0, -0.207693101, 0), x_dir=(0.849682982948563, 0, -0.5272938729851051), z_dir=(0, 1, 0)) * Cylinder(16.45, 25, mode=Mode.PRIVATE)
    cong_1_piece_13 = cong_1_piece_13a & cong_1_piece_13b
    add(cong_1_piece_13)
    with BuildSketch(Plane(origin=(5.845557086, 0, -11.148857945), x_dir=(-0.7071067811865465, 0, -0.7071067811865485), z_dir=(0.7071067811865485, 0, -0.7071067811865467))) as cong_1_piece_14a_section:
        with BuildLine():
            CenterArc((1.6, -2), CONG_1_R, 90, 53.130102354)
            Line((0, -0.8), (-0.032, -0.776))
            ThreePointArc((-0.032, -0.776), (-0.04, -0.4), (-0.04, 0))
            Line((-0.04, 0), (0, 0.04))
            Line((0, 0.04), (1.6, 0.04))
            Line((1.6, 0.04), (1.6, 0))
        make_face()
    cong_1_piece_14a = extrude(amount=9.025434204, mode=Mode.PRIVATE)
    cong_1_piece_14a = cong_1_piece_14a & Plane(origin=(0, -0.207693111, 0), x_dir=(0.849682982948563, 0, -0.5272938729851051), z_dir=(0, 1, 0)) * Cylinder(16.45, 25, mode=Mode.PRIVATE)
    with BuildSketch(Plane(origin=(0, 0, 0), x_dir=(0.9516469062705674, 0, -0.30719401977521954), z_dir=(0.30719401977521954, 0, 0.9516469062705674))) as cong_1_piece_14b_section:
        with BuildLine():
            CenterArc((14.85, -2), CONG_1_R, 36.869897646, 53.130102354)
            Line((16.45, -0.8), (16.482, -0.776))
            ThreePointArc((16.482, -0.776), (16.49, -0.4), (16.49, 0))
            Line((16.49, 0), (16.45, 0.04))
            Line((16.45, 0.04), (14.85, 0.04))
            Line((14.85, 0.04), (14.85, 0))
        make_face()
    cong_1_piece_14b = revolve(axis=Axis((0, 0, 0), (0, 1, 0)), revolution_arc=54.21957961, mode=Mode.PRIVATE)
    cong_1_piece_14b = split(cong_1_piece_14b, bisect_by=Plane(origin=(7.970374673, -0.210053705, -13.273675532), z_dir=(-0.7071067811865467, 0, -0.7071067811865485)), keep=Keep.TOP, mode=Mode.PRIVATE)
    cong_1_piece_14 = cong_1_piece_14a & cong_1_piece_14b
    add(cong_1_piece_14)
    with BuildSketch(Plane(origin=(-12.227502814, 0, -17.530803673), x_dir=(0.7071067811865467, 0, -0.7071067811865483), z_dir=(0.7071067811865485, 0, 0.7071067811865467))) as cong_1_piece_15a_section:
        with BuildLine():
            CenterArc((1.6, -2), CONG_1_R, 90, 53.130102354)
            Line((0, -0.8), (-0.032, -0.776))
            ThreePointArc((-0.032, -0.776), (-0.04, -0.4), (-0.04, 0))
            Line((-0.04, 0), (0, 0.04))
            Line((0, 0.04), (1.6, 0.04))
            Line((1.6, 0.04), (1.6, 0))
        make_face()
    cong_1_piece_15a = extrude(amount=9.025434204, mode=Mode.PRIVATE)
    cong_1_piece_15a = cong_1_piece_15a & Plane(origin=(0, -0.207693101, 0), x_dir=(-0.5272938729851264, 0, -0.8496829829485496), z_dir=(0, 1, 0)) * Cylinder(16.45, 25, mode=Mode.PRIVATE)
    with BuildSketch(Plane(origin=(0, 0, 0), x_dir=(-0.30719401977524424, 0, -0.9516469062705595), z_dir=(0.9516469062705595, 0, -0.30719401977524424))) as cong_1_piece_15b_section:
        with BuildLine():
            CenterArc((14.85, -2), CONG_1_R, 36.869897646, 53.130102354)
            Line((16.45, -0.8), (16.482, -0.776))
            ThreePointArc((16.482, -0.776), (16.49, -0.4), (16.49, 0))
            Line((16.49, 0), (16.45, 0.04))
            Line((16.45, 0.04), (14.85, 0.04))
            Line((14.85, 0.04), (14.85, 0))
        make_face()
    cong_1_piece_15b = revolve(axis=Axis((0, 0, 0), (0, 1, 0)), revolution_arc=54.21957961, mode=Mode.PRIVATE)
    cong_1_piece_15b = split(cong_1_piece_15b, bisect_by=Plane(origin=(-7.970374481, -0.21005361, -13.27367534), z_dir=(0.7071067811865467, 0, -0.7071067811865485)), keep=Keep.TOP, mode=Mode.PRIVATE)
    cong_1_piece_15 = cong_1_piece_15a & cong_1_piece_15b
    add(cong_1_piece_15)
    with BuildSketch(Plane(origin=(-11.148857945, 0, -5.845557086), x_dir=(-0.7071067811865459, 0, 0.7071067811865492), z_dir=(-0.7071067811865492, 0, -0.7071067811865458))) as cong_1_piece_16a_section:
        with BuildLine():
            CenterArc((1.6, -2), CONG_1_R, 90, 53.130102354)
            Line((0, -0.8), (-0.032, -0.776))
            ThreePointArc((-0.032, -0.776), (-0.04, -0.4), (-0.04, 0))
            Line((-0.04, 0), (0, 0.04))
            Line((0, 0.04), (1.6, 0.04))
            Line((1.6, 0.04), (1.6, 0))
        make_face()
    cong_1_piece_16a = extrude(amount=9.025434204, mode=Mode.PRIVATE)
    cong_1_piece_16a = cong_1_piece_16a & Plane(origin=(0, -0.207693111, 0), x_dir=(-0.5272938729851264, 0, -0.8496829829485496), z_dir=(0, 1, 0)) * Cylinder(16.45, 25, mode=Mode.PRIVATE)
    with BuildSketch(Plane(origin=(0, 0, 0), x_dir=(-0.30719401977524424, 0, -0.9516469062705595), z_dir=(0.9516469062705595, 0, -0.30719401977524424))) as cong_1_piece_16b_section:
        with BuildLine():
            CenterArc((14.85, -2), CONG_1_R, 36.869897646, 53.130102354)
            Line((16.45, -0.8), (16.482, -0.776))
            ThreePointArc((16.482, -0.776), (16.49, -0.4), (16.49, 0))
            Line((16.49, 0), (16.45, 0.04))
            Line((16.45, 0.04), (14.85, 0.04))
            Line((14.85, 0.04), (14.85, 0))
        make_face()
    cong_1_piece_16b = revolve(axis=Axis((0, 0, 0), (0, 1, 0)), revolution_arc=54.21957961, mode=Mode.PRIVATE)
    cong_1_piece_16b = split(cong_1_piece_16b, bisect_by=Plane(origin=(-13.273675532, -0.210053705, -7.970374673), z_dir=(-0.7071067811865458, 0, 0.7071067811865492)), keep=Keep.TOP, mode=Mode.PRIVATE)
    cong_1_piece_16 = cong_1_piece_16a & cong_1_piece_16b
    add(cong_1_piece_16)

    # Esquisse6 → Enlèv. mat.-Extru.3 (cut)
    with BuildSketch(Plane.XZ):
        with Locations((12.430469628, 1.379302172)):
            Rectangle(ESQUISSE6_W, ESQUISSE6_H)
    extrude(amount=-ENL_V_MAT_EXTRU_3_DEPTH, mode=Mode.SUBTRACT)

    # Esquisse7 → Enlèv. mat.-Extru.4 (cut)
    with BuildSketch(Plane.XZ):
        with Locations((0, 4)):
            Rectangle(ESQUISSE7_W, ESQUISSE7_H)
    extrude(amount=-ENL_V_MAT_EXTRU_4_DEPTH, mode=Mode.SUBTRACT)

    # Esquisse8 → Enlèv. mat.-Extru.5 (cut)
    with BuildSketch(Plane.XZ):
        with Locations((0, 16.56378264)):
            Rectangle(ESQUISSE8_W, ESQUISSE8_H)
    extrude(amount=-ENL_V_MAT_EXTRU_5_DEPTH, mode=Mode.SUBTRACT)


solid = part.part
